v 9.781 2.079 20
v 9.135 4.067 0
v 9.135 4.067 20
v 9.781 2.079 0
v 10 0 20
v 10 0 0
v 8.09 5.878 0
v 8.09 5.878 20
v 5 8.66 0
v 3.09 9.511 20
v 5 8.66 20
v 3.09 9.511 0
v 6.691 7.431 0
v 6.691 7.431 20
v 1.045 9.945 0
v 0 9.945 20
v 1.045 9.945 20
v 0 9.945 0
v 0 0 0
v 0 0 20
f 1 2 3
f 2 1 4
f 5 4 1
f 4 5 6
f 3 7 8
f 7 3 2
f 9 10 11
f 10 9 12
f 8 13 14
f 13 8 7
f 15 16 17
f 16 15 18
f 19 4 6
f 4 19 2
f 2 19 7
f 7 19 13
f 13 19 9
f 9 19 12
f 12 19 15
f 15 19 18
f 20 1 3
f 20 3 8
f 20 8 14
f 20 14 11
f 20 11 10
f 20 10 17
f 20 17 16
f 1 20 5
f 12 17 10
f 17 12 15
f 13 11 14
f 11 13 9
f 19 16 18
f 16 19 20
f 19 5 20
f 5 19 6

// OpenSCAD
intersection(){
    cylinder(h=20, r=10);
    cube([20,20,20]);
}
